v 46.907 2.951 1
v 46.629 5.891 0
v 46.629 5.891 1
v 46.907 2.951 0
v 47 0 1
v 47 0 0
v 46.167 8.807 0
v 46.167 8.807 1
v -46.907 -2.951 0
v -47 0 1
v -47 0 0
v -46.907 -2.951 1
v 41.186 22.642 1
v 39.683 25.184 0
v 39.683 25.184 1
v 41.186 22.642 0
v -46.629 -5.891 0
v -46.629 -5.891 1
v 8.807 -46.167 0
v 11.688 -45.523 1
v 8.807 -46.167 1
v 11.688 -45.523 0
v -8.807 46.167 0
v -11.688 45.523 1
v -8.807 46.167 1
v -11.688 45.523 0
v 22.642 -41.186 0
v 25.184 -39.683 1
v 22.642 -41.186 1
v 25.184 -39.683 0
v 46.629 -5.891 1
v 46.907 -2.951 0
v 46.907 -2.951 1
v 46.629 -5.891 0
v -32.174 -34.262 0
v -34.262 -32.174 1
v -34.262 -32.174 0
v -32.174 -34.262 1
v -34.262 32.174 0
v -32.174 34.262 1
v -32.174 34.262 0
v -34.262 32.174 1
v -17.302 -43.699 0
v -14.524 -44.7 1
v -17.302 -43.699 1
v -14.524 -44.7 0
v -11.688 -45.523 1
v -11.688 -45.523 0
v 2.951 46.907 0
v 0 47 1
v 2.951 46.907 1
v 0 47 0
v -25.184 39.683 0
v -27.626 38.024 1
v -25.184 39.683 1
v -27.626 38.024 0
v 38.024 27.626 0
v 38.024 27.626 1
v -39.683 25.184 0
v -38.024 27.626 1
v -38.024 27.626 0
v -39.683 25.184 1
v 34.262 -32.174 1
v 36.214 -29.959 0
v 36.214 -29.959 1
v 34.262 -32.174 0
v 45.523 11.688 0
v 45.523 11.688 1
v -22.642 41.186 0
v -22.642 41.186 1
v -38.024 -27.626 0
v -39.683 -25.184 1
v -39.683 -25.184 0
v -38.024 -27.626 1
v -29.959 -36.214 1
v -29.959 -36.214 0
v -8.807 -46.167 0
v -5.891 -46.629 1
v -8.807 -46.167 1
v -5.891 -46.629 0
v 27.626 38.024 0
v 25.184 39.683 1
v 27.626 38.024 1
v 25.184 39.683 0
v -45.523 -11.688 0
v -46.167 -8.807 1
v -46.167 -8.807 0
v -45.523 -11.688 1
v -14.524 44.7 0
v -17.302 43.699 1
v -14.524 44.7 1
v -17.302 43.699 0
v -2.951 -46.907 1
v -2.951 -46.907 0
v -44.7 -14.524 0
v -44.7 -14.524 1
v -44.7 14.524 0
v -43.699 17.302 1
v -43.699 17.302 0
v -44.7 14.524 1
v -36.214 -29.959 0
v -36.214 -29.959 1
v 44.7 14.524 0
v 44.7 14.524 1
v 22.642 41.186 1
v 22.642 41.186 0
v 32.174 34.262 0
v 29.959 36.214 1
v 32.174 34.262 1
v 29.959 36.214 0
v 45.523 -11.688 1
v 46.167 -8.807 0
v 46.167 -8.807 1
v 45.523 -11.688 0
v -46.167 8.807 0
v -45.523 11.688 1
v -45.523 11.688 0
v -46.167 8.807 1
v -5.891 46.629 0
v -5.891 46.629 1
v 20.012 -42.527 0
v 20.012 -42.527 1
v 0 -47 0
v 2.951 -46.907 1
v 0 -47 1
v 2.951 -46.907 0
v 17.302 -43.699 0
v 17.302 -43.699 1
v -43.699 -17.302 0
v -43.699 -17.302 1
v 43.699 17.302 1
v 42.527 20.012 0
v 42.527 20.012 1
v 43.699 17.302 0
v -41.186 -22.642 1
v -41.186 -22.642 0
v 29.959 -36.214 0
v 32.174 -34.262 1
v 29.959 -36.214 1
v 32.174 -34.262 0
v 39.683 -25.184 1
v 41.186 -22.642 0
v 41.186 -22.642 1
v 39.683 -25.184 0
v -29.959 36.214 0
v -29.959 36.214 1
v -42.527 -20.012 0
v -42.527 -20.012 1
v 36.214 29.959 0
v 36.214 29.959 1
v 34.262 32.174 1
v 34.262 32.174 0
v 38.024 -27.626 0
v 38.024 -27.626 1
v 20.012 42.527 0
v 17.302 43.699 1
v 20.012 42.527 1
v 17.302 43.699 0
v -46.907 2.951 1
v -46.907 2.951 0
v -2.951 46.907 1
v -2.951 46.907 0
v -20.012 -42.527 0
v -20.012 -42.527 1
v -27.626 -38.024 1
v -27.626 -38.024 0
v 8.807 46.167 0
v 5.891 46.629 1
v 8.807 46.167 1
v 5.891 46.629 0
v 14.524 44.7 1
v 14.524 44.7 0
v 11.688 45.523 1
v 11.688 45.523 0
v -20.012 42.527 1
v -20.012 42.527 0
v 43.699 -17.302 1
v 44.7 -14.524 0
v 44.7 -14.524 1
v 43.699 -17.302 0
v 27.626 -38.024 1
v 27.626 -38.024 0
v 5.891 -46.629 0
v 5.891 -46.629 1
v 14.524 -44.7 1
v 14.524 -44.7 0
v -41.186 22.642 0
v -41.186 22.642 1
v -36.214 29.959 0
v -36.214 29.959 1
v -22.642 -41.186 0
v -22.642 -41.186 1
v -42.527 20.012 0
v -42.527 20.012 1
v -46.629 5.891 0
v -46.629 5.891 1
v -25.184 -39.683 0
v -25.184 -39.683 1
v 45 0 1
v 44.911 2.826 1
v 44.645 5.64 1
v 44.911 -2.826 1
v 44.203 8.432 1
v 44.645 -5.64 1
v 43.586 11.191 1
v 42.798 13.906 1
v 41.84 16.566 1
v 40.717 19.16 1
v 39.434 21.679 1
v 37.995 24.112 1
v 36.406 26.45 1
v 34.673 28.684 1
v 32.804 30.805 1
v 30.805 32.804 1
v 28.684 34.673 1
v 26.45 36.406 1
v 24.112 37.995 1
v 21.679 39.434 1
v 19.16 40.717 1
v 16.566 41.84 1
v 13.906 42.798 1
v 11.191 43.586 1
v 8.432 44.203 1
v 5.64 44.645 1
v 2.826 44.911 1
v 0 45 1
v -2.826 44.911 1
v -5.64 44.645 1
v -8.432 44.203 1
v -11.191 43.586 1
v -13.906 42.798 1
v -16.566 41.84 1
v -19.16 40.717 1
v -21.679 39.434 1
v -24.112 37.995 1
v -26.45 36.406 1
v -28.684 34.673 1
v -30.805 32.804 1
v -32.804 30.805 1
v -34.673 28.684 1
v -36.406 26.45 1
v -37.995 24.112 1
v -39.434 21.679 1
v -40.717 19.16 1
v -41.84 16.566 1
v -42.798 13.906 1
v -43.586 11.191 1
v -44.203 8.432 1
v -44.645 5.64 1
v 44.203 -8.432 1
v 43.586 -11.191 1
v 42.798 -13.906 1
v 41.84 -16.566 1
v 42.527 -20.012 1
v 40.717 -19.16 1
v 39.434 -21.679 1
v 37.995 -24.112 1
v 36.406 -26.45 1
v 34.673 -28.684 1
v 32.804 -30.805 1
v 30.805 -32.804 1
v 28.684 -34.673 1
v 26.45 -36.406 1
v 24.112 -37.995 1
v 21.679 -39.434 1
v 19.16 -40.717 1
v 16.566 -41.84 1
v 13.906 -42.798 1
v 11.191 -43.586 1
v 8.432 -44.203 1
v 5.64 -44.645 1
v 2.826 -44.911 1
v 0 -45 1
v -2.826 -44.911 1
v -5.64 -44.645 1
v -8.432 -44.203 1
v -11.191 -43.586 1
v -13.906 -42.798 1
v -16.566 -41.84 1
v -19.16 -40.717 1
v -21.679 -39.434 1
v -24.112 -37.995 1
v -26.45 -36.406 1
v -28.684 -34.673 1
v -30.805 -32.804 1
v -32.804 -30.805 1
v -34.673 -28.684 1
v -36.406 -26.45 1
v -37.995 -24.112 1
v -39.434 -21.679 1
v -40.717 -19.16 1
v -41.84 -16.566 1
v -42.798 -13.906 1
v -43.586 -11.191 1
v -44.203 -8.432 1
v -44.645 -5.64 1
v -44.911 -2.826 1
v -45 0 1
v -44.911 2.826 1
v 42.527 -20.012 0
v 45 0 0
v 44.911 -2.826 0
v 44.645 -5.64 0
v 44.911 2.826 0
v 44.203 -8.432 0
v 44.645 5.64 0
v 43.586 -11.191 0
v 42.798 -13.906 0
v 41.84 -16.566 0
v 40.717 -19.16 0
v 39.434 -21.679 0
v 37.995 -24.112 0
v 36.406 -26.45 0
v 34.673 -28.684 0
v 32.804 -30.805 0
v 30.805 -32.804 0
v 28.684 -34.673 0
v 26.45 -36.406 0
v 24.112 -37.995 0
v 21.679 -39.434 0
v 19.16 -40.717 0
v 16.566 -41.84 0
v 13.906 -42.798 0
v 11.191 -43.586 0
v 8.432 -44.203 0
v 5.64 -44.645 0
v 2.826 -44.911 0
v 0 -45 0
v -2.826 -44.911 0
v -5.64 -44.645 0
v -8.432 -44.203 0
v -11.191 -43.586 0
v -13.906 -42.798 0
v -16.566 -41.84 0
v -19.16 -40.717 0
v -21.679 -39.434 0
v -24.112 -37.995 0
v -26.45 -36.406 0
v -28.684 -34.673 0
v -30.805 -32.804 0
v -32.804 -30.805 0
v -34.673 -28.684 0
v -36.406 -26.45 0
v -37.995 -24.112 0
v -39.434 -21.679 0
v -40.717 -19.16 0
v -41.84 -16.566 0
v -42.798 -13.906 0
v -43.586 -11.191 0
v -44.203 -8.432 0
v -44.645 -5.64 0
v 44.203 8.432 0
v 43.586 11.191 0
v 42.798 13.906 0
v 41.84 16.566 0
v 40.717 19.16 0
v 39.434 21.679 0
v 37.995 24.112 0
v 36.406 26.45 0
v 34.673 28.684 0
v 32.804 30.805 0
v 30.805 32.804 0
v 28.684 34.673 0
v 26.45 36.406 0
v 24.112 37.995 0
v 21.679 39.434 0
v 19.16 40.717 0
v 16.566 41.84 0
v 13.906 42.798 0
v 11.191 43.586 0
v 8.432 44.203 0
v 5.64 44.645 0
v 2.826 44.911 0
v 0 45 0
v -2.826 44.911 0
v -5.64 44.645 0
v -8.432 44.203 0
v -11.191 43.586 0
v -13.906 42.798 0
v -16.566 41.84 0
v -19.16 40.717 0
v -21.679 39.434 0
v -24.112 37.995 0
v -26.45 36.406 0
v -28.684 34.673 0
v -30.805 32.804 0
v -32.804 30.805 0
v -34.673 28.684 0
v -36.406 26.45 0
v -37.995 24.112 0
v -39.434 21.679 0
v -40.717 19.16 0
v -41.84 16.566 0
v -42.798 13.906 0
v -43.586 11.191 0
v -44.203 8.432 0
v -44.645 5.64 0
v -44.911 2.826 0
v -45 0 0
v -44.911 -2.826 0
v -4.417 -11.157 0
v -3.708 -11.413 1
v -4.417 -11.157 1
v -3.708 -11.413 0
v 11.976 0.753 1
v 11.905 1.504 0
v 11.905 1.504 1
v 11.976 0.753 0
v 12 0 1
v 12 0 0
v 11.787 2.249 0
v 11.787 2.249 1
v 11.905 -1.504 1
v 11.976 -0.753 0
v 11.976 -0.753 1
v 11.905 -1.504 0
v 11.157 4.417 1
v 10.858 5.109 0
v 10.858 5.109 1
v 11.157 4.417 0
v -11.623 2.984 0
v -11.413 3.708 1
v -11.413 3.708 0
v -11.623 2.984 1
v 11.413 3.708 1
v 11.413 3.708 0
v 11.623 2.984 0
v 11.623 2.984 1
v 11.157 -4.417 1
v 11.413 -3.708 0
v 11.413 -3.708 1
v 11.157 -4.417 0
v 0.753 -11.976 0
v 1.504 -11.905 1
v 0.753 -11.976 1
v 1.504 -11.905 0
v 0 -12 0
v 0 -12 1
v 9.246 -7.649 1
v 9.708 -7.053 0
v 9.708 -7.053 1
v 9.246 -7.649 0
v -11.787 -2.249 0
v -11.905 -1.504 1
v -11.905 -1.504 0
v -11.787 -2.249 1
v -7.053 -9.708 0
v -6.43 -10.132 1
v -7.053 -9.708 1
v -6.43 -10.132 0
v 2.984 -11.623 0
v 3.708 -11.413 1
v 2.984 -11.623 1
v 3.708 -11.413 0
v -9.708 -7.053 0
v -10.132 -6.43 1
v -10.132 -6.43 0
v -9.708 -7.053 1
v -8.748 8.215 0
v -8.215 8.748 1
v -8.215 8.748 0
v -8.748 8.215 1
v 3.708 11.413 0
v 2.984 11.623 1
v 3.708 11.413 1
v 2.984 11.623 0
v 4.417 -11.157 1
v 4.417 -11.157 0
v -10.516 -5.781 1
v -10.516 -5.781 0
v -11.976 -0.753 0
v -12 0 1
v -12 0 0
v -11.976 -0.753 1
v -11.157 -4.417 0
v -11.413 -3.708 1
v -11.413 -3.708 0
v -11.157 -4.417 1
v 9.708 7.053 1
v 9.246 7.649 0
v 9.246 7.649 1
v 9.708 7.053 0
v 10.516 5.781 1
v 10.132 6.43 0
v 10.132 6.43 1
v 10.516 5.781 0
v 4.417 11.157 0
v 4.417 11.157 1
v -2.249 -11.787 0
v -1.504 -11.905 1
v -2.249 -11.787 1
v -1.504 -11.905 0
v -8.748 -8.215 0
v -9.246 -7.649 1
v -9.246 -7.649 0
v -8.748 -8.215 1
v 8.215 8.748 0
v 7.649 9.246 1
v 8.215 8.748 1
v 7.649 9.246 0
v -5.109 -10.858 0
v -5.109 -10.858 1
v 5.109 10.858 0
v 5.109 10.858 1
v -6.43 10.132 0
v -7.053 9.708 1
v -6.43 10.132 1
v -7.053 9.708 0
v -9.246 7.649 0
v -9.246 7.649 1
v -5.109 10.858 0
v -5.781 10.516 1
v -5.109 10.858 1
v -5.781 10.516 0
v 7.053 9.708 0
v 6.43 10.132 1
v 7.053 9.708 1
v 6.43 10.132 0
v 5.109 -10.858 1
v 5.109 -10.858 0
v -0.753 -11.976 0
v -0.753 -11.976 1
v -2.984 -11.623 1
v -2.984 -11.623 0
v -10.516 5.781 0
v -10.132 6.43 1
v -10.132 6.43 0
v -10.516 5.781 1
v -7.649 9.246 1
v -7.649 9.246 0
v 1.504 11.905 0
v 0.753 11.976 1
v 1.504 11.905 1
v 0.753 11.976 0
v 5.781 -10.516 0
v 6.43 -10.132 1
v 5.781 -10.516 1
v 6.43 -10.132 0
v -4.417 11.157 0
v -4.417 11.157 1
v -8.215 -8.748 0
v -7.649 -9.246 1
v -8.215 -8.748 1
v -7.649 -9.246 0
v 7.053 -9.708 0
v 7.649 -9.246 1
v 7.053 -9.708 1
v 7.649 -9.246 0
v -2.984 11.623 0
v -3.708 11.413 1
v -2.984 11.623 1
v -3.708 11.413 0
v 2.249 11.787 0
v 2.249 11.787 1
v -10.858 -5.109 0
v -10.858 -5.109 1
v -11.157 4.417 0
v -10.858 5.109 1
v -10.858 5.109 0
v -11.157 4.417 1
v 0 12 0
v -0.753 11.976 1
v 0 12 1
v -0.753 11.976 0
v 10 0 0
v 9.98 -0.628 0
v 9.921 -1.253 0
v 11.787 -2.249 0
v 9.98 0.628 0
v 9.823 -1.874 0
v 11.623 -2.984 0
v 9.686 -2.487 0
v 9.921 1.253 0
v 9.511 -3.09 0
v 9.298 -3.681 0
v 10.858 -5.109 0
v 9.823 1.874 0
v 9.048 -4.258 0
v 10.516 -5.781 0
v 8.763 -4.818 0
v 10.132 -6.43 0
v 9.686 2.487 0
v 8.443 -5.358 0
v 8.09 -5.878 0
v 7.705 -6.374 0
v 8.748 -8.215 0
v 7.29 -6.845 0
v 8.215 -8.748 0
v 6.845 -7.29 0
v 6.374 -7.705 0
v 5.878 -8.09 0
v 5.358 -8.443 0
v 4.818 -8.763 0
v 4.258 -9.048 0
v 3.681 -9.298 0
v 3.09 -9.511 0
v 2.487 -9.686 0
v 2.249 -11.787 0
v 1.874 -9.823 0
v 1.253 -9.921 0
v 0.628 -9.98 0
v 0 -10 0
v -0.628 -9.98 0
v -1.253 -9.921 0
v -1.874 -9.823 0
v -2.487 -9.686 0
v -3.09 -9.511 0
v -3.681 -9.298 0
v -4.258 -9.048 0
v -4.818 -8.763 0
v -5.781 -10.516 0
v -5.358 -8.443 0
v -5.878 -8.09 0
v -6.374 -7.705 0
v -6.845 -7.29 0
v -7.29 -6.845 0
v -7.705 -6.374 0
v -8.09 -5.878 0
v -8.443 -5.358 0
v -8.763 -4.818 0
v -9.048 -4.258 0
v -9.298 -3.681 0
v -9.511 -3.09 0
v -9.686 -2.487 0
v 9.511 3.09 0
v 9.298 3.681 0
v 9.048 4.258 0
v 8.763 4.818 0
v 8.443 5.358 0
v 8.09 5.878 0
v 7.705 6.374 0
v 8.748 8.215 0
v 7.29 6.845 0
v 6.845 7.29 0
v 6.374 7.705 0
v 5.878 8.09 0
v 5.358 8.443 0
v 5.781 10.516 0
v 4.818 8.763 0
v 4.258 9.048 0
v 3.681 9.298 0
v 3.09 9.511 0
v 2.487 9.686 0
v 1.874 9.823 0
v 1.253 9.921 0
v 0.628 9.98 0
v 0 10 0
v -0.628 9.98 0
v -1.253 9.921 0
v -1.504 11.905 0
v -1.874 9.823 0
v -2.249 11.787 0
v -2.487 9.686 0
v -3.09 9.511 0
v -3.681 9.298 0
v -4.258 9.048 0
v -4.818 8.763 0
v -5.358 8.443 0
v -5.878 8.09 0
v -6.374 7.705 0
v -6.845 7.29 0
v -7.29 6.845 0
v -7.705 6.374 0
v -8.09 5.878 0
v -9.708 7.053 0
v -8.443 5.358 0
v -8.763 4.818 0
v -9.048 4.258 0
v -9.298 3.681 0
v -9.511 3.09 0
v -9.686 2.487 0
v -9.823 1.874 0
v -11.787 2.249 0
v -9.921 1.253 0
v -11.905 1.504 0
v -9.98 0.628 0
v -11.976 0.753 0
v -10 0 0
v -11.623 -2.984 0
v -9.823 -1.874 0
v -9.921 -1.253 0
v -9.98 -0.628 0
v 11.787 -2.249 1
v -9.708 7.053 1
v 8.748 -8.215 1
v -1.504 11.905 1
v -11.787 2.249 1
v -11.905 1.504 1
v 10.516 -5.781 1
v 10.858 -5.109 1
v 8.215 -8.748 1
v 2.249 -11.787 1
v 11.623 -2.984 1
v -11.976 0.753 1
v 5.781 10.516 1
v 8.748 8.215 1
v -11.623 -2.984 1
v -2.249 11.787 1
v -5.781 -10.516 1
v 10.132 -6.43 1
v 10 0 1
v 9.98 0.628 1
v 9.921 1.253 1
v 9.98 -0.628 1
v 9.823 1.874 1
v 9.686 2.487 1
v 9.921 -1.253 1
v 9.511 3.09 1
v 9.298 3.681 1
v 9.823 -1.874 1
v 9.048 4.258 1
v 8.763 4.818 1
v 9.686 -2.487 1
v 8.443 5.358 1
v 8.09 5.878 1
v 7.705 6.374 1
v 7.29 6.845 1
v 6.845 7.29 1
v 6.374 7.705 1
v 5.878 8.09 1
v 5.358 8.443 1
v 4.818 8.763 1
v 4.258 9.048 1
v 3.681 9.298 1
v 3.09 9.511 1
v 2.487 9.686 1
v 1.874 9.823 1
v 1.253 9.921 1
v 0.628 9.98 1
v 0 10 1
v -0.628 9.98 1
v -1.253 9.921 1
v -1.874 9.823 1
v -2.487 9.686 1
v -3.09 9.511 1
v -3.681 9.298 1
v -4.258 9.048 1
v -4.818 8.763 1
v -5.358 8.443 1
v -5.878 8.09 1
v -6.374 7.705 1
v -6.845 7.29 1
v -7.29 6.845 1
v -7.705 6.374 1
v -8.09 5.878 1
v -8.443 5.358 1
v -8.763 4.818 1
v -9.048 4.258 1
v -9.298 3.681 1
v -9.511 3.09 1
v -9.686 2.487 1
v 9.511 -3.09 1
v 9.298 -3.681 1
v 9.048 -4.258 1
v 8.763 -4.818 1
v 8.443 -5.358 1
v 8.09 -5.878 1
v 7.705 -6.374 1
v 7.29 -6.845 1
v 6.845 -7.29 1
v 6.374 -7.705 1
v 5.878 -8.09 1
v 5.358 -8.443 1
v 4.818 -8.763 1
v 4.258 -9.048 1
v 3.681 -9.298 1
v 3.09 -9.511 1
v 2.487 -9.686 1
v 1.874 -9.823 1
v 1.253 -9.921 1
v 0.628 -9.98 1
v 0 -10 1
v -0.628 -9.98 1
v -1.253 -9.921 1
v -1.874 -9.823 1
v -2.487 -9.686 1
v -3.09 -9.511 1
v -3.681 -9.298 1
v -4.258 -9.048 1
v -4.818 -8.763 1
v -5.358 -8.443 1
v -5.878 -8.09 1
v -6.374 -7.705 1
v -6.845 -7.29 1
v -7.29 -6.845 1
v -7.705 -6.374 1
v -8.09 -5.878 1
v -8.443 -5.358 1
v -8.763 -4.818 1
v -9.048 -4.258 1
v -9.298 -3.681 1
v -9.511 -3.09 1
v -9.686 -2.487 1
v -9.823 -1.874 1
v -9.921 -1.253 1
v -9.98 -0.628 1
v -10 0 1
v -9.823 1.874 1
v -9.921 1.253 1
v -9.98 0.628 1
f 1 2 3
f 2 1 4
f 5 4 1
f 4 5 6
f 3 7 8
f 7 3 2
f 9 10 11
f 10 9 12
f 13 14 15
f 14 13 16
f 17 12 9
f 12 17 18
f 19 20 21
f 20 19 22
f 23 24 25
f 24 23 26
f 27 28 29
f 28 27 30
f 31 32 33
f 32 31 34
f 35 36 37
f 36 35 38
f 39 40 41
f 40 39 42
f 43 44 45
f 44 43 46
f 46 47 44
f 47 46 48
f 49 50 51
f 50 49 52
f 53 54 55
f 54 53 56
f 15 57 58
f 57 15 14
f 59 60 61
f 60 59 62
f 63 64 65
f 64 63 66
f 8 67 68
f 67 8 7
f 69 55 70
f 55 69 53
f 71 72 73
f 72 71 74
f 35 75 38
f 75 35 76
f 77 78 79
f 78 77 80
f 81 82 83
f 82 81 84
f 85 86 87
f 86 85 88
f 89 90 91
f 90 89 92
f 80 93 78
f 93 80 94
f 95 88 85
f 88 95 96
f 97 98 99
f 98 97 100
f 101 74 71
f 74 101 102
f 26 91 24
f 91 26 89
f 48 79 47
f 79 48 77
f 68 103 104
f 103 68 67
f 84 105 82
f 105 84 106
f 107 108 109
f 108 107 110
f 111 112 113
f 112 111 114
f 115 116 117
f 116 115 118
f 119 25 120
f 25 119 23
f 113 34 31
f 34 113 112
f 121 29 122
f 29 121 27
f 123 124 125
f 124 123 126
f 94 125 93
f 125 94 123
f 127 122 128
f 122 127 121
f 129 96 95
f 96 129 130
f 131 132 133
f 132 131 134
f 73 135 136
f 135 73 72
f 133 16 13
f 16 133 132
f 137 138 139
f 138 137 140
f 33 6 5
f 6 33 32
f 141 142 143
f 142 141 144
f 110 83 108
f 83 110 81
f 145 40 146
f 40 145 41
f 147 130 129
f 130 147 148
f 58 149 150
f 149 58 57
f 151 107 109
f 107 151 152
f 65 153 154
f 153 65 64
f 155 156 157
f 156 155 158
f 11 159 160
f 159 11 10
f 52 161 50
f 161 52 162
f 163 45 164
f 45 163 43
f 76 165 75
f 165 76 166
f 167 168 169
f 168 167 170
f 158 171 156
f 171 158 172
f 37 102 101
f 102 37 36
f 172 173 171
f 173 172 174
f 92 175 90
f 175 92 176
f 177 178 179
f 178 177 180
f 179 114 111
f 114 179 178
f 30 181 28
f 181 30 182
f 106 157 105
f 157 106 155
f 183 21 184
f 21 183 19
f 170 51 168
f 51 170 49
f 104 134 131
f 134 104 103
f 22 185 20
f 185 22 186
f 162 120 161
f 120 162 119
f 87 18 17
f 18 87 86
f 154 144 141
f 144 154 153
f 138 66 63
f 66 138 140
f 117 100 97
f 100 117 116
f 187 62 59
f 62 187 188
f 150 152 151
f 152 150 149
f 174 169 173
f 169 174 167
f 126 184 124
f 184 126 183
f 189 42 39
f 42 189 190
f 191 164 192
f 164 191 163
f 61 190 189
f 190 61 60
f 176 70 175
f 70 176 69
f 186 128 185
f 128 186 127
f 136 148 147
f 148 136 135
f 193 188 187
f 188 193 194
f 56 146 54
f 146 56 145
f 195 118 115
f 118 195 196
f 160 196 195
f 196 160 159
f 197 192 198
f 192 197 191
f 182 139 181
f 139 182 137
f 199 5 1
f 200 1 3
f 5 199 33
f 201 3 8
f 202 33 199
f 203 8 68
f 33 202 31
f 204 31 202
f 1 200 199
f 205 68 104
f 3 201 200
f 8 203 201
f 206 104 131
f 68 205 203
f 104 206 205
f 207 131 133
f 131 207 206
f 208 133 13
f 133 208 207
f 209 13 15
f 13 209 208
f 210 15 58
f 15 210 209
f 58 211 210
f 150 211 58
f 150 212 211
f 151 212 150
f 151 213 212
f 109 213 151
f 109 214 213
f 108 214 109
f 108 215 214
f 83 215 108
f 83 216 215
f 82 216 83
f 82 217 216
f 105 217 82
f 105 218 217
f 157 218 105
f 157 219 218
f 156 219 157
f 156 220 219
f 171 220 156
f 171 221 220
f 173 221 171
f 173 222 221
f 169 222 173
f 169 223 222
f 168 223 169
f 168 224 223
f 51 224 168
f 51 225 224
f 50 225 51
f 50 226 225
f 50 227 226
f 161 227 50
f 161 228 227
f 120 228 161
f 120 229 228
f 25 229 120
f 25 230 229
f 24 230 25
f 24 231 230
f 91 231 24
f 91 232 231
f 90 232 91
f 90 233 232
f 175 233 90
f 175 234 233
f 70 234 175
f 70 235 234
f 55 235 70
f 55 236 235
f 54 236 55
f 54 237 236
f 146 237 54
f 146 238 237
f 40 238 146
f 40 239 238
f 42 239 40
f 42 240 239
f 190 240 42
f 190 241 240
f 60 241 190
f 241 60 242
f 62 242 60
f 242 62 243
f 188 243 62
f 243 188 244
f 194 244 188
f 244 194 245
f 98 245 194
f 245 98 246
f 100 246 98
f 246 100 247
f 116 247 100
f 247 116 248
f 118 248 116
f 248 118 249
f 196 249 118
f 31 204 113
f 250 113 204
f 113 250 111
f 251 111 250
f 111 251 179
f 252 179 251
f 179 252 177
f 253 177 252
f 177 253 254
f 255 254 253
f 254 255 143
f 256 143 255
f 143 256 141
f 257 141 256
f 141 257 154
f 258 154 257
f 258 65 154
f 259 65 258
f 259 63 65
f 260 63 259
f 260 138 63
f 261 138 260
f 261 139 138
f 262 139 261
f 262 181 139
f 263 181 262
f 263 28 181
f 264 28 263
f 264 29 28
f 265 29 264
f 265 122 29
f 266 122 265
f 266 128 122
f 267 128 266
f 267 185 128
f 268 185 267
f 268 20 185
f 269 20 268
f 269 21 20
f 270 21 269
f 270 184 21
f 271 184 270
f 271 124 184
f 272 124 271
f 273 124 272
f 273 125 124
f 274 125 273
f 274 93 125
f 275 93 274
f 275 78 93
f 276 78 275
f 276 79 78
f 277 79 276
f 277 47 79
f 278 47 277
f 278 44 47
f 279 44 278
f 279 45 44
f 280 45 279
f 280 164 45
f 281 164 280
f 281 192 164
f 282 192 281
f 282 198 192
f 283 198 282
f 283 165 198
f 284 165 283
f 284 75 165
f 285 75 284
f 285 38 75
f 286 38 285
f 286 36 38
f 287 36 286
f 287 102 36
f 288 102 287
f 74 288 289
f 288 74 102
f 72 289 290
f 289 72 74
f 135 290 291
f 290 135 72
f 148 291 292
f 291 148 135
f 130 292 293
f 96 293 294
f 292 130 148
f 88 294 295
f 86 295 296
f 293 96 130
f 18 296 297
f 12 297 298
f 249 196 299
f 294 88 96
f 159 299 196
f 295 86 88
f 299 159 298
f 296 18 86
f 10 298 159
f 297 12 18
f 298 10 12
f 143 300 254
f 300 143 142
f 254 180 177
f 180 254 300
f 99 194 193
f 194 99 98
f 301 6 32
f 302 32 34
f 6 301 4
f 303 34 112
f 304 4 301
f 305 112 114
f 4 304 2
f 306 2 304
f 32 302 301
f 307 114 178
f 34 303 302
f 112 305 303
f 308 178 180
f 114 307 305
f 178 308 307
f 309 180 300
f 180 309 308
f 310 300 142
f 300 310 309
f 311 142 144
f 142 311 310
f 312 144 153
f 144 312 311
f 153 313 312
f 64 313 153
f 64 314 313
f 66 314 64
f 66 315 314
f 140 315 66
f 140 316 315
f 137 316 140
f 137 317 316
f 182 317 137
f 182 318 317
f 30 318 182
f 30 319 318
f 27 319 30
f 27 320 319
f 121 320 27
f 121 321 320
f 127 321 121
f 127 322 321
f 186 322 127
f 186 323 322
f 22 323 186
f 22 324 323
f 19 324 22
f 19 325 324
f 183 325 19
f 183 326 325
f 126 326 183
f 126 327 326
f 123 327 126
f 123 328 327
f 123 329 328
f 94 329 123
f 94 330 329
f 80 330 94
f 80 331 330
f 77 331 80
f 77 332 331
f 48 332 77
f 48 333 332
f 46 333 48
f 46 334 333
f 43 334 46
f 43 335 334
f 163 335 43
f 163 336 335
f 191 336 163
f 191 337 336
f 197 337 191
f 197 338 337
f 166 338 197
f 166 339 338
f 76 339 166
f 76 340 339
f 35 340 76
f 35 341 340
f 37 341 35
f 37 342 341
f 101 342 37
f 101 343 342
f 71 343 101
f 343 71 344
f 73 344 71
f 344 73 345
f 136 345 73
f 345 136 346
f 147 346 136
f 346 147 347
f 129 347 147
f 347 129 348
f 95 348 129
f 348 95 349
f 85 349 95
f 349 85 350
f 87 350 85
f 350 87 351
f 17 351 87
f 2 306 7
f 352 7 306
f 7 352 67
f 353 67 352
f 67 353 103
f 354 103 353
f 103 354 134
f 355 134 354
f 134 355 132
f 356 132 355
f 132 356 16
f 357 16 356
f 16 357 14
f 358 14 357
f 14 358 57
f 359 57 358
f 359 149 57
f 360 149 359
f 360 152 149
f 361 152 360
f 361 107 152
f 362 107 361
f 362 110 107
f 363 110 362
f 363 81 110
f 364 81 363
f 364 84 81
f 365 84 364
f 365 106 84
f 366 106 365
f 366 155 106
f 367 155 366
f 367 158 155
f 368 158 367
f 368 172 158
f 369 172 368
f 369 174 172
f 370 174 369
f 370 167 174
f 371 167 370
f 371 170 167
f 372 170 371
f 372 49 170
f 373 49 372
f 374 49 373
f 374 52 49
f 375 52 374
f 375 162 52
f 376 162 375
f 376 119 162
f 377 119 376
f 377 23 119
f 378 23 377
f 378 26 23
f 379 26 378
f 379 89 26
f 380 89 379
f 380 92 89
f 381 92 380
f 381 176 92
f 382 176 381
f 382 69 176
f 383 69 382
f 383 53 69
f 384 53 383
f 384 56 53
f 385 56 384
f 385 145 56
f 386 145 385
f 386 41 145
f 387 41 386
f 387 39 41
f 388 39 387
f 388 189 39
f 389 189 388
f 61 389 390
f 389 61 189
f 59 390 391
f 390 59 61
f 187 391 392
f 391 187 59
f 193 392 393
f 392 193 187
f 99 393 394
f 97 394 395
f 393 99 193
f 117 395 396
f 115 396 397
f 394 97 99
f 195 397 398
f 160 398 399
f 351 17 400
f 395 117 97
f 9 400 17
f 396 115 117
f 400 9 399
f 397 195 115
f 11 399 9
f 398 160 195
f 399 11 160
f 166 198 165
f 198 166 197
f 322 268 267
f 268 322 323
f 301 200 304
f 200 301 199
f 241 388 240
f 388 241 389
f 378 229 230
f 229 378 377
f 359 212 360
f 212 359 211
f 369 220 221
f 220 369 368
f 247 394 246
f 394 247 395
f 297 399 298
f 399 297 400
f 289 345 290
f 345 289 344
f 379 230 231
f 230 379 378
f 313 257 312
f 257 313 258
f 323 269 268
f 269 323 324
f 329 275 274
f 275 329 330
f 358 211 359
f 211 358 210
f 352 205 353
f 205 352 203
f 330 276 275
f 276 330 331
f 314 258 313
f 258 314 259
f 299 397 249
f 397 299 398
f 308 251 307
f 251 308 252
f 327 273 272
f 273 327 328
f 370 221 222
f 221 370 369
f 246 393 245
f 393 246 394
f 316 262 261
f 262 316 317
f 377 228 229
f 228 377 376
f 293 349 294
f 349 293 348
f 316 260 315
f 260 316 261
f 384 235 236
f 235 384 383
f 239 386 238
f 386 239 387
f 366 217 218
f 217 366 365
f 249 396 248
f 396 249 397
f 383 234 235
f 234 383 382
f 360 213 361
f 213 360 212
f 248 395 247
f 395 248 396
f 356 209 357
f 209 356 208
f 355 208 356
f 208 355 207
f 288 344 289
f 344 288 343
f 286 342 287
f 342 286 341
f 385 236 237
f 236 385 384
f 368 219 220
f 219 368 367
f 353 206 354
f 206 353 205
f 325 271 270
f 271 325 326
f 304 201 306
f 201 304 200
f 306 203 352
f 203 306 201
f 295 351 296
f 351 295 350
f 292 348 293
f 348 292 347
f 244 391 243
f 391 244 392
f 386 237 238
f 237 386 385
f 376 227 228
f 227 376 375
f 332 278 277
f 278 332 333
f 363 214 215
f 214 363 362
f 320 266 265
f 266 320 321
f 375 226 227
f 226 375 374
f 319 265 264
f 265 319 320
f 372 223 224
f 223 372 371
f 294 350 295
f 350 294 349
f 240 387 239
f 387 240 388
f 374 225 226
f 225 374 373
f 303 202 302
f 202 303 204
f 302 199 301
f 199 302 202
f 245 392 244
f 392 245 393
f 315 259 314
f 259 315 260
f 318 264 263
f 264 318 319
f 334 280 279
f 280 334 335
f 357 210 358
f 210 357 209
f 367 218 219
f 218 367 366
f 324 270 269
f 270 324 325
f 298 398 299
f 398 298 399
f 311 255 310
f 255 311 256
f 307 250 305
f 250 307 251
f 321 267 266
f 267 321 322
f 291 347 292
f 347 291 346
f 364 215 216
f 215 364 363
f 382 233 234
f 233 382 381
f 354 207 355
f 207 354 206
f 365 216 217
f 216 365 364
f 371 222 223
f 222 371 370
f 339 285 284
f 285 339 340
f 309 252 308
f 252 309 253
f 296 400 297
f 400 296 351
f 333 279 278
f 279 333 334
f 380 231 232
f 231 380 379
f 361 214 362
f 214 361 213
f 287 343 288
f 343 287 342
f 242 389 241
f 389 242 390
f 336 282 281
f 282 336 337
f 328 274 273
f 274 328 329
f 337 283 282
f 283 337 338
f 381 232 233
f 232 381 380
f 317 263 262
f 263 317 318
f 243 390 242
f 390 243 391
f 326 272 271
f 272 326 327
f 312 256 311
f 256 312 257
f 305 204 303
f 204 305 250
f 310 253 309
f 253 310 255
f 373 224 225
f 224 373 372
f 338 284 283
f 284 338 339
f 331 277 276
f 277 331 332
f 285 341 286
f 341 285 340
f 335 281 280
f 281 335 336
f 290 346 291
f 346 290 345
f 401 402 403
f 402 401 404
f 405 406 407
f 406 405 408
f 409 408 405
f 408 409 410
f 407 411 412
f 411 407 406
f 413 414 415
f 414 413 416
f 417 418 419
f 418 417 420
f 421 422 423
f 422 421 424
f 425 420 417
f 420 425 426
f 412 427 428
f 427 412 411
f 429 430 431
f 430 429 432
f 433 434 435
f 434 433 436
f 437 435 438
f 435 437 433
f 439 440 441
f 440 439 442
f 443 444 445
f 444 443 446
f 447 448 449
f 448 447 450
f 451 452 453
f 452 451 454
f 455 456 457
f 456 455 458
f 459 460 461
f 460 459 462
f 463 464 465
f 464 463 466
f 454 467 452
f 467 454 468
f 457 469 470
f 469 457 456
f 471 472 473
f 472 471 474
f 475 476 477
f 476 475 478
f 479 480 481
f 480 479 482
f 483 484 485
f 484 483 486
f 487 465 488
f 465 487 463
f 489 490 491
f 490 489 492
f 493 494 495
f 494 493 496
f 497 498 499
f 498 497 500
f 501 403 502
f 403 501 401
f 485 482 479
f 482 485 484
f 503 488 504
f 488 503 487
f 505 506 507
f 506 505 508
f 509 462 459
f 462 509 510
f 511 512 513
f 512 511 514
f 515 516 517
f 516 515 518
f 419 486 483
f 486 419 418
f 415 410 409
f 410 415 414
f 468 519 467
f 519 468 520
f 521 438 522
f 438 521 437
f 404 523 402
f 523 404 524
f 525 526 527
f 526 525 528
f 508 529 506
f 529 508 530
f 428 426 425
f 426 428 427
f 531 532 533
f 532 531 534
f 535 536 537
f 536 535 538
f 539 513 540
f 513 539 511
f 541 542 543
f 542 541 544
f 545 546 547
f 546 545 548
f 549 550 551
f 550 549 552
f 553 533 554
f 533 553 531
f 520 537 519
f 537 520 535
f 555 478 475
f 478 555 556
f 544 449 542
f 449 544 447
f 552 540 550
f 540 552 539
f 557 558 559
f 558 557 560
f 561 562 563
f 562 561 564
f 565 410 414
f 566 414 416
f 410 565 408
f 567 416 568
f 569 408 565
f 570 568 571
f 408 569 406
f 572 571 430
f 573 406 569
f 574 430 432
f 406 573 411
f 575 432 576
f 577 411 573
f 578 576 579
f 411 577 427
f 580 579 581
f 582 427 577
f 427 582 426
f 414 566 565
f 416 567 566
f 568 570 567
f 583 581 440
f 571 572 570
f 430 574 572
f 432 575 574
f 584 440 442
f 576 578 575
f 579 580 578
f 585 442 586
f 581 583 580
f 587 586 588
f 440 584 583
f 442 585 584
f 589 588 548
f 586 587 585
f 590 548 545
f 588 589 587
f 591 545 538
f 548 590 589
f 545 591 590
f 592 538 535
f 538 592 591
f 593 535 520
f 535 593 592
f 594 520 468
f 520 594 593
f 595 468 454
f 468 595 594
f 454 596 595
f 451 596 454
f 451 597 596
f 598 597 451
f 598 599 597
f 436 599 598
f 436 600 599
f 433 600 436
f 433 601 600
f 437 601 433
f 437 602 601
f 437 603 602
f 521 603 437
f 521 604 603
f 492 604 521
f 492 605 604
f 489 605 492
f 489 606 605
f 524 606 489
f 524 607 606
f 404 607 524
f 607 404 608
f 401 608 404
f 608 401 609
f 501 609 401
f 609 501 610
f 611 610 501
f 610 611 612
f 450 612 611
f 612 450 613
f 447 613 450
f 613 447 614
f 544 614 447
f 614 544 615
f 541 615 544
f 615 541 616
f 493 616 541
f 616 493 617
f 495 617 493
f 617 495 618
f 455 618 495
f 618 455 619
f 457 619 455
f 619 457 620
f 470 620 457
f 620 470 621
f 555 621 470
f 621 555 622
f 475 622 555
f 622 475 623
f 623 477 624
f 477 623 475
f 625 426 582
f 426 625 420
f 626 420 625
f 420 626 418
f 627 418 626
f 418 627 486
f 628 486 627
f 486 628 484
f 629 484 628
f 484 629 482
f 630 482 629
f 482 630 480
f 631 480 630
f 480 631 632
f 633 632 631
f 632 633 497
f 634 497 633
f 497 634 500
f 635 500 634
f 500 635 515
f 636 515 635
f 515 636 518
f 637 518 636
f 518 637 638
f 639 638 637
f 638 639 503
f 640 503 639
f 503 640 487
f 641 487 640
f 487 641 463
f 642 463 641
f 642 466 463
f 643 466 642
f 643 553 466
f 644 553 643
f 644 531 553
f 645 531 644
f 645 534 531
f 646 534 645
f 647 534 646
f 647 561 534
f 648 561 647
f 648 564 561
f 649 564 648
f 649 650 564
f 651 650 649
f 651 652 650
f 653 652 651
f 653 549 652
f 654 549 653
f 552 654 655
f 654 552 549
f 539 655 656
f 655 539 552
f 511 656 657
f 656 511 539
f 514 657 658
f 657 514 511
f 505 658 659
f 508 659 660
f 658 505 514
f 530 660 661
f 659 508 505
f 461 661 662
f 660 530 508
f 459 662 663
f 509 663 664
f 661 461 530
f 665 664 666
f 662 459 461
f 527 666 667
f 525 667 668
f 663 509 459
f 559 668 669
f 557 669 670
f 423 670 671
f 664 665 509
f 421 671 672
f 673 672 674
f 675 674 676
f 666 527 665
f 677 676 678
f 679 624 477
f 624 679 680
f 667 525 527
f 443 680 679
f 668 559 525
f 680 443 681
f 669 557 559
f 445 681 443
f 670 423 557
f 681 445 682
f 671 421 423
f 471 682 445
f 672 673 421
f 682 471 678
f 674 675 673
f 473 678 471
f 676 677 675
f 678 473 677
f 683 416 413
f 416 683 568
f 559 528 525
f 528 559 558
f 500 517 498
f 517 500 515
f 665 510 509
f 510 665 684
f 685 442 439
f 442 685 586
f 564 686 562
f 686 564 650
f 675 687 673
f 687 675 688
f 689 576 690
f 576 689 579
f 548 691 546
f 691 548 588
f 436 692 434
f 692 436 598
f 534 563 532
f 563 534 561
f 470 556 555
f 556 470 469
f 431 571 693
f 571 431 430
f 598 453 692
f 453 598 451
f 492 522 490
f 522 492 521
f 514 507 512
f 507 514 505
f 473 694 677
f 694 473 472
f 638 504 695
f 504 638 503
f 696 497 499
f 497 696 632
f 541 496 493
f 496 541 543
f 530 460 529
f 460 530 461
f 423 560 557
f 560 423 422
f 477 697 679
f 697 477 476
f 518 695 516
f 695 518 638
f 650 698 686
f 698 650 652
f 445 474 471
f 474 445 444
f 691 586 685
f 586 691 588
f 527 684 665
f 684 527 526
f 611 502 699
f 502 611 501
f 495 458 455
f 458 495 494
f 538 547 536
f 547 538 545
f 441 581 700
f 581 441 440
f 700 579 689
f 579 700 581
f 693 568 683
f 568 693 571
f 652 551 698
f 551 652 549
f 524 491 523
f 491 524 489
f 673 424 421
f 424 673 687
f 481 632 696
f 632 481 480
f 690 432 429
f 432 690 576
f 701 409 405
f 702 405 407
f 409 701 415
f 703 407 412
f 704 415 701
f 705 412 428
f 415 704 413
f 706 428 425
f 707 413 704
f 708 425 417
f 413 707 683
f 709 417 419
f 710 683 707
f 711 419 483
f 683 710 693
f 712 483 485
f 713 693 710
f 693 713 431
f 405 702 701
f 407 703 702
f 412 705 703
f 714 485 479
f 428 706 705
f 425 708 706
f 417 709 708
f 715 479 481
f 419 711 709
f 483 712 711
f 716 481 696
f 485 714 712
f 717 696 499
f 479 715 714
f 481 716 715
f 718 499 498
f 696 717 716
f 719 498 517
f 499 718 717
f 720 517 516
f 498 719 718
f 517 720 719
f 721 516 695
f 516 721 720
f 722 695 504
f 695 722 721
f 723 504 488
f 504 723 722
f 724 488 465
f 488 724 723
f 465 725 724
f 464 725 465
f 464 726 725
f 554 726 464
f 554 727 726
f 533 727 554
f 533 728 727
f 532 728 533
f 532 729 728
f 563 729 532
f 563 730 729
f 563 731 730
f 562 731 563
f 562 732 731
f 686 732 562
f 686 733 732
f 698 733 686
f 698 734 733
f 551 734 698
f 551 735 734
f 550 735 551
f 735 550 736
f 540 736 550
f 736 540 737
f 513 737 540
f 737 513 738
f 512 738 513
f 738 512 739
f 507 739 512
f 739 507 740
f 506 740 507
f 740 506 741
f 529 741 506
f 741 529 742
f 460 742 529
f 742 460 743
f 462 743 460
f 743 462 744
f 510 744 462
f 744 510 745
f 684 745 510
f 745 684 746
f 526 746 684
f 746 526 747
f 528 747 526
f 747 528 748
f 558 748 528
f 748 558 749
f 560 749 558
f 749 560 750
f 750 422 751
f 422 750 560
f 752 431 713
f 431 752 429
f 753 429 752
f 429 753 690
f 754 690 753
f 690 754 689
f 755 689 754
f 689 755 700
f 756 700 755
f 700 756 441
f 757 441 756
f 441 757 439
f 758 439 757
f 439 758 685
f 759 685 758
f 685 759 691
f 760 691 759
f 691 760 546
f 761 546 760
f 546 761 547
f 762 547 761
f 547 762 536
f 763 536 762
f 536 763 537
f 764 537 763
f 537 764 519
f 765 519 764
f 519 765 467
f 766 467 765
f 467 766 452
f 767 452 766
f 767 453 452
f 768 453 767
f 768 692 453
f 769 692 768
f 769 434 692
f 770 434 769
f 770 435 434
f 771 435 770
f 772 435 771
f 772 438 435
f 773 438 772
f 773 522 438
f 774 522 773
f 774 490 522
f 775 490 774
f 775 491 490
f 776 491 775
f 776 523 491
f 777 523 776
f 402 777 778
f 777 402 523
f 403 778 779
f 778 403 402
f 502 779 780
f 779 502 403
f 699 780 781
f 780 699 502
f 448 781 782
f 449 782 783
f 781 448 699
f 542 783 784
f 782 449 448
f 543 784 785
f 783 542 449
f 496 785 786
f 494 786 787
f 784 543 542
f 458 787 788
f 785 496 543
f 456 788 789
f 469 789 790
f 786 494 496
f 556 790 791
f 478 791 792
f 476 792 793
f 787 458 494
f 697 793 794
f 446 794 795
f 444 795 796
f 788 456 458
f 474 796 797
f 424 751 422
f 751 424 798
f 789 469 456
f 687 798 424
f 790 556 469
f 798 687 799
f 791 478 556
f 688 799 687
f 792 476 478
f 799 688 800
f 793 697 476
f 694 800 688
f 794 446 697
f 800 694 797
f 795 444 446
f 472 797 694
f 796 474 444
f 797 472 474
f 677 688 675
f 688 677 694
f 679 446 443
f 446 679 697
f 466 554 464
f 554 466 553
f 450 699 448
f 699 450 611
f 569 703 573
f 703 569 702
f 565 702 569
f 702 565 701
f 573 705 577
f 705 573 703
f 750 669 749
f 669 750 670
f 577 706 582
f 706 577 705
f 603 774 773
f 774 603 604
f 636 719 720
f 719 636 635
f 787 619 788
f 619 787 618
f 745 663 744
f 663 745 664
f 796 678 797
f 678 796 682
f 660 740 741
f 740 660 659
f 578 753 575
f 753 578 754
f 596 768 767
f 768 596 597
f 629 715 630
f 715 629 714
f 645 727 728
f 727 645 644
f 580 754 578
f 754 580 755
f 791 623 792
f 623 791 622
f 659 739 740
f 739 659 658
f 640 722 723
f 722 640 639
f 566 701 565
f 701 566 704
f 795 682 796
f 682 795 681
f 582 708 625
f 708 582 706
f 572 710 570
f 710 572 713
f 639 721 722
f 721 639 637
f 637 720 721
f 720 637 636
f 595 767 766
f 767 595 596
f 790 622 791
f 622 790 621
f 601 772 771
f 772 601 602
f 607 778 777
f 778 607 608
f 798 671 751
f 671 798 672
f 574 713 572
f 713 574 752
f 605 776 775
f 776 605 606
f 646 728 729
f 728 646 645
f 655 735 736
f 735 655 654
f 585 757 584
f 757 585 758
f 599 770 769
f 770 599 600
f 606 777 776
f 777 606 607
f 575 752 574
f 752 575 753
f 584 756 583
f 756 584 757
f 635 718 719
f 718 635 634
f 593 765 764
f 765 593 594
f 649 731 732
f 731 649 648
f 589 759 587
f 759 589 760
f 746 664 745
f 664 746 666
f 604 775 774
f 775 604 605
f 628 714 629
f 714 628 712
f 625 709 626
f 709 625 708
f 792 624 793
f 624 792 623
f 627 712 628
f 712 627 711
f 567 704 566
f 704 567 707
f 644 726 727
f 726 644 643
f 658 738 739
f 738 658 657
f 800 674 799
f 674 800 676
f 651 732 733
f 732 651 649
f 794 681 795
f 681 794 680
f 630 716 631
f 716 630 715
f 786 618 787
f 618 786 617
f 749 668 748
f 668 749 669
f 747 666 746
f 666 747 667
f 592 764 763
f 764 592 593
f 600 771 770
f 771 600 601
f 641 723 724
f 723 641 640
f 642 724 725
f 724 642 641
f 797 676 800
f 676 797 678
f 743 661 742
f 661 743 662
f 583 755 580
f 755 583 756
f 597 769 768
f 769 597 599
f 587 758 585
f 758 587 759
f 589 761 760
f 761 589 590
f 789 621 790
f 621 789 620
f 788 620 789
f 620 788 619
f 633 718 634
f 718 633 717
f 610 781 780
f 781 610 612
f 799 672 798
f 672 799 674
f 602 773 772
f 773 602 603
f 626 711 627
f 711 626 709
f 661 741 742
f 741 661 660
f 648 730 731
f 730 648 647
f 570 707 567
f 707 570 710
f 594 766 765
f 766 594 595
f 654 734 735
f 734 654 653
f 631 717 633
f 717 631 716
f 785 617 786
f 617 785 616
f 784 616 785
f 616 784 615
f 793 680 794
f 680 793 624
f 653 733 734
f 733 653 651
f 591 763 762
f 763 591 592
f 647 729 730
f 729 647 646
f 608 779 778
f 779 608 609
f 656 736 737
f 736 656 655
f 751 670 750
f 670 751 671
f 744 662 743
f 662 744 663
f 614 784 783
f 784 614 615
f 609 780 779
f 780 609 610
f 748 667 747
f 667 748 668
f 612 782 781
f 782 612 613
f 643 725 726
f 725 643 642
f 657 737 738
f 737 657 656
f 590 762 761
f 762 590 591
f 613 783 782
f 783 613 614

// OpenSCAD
$fn = 100;

module ring(h, d, t) {
  difference() {
    cylinder(h=h, d=d);
    cylinder(h=h, d=d-t);
  }
}


ring(1, 94, 4);
ring(1, 24, 4);
//rotate([0, 0, 0 * 72]) translate([-1, 12, 0]) cube([2, 34, 1]);
//rotate([0, 0, 1 * 72]) translate([-1, 12, 0]) cube([2, 34, 1]);
//rotate([0, 0, 2 * 72]) translate([-1, 12, 0]) cube([2, 34, 1]);
//rotate([0, 0, 3 * 72]) translate([-1, 12, 0]) cube([2, 34, 1]);
//rotate([0, 0, 4 * 72]) translate([-1, 12, 0]) cube([2, 34, 1]);
